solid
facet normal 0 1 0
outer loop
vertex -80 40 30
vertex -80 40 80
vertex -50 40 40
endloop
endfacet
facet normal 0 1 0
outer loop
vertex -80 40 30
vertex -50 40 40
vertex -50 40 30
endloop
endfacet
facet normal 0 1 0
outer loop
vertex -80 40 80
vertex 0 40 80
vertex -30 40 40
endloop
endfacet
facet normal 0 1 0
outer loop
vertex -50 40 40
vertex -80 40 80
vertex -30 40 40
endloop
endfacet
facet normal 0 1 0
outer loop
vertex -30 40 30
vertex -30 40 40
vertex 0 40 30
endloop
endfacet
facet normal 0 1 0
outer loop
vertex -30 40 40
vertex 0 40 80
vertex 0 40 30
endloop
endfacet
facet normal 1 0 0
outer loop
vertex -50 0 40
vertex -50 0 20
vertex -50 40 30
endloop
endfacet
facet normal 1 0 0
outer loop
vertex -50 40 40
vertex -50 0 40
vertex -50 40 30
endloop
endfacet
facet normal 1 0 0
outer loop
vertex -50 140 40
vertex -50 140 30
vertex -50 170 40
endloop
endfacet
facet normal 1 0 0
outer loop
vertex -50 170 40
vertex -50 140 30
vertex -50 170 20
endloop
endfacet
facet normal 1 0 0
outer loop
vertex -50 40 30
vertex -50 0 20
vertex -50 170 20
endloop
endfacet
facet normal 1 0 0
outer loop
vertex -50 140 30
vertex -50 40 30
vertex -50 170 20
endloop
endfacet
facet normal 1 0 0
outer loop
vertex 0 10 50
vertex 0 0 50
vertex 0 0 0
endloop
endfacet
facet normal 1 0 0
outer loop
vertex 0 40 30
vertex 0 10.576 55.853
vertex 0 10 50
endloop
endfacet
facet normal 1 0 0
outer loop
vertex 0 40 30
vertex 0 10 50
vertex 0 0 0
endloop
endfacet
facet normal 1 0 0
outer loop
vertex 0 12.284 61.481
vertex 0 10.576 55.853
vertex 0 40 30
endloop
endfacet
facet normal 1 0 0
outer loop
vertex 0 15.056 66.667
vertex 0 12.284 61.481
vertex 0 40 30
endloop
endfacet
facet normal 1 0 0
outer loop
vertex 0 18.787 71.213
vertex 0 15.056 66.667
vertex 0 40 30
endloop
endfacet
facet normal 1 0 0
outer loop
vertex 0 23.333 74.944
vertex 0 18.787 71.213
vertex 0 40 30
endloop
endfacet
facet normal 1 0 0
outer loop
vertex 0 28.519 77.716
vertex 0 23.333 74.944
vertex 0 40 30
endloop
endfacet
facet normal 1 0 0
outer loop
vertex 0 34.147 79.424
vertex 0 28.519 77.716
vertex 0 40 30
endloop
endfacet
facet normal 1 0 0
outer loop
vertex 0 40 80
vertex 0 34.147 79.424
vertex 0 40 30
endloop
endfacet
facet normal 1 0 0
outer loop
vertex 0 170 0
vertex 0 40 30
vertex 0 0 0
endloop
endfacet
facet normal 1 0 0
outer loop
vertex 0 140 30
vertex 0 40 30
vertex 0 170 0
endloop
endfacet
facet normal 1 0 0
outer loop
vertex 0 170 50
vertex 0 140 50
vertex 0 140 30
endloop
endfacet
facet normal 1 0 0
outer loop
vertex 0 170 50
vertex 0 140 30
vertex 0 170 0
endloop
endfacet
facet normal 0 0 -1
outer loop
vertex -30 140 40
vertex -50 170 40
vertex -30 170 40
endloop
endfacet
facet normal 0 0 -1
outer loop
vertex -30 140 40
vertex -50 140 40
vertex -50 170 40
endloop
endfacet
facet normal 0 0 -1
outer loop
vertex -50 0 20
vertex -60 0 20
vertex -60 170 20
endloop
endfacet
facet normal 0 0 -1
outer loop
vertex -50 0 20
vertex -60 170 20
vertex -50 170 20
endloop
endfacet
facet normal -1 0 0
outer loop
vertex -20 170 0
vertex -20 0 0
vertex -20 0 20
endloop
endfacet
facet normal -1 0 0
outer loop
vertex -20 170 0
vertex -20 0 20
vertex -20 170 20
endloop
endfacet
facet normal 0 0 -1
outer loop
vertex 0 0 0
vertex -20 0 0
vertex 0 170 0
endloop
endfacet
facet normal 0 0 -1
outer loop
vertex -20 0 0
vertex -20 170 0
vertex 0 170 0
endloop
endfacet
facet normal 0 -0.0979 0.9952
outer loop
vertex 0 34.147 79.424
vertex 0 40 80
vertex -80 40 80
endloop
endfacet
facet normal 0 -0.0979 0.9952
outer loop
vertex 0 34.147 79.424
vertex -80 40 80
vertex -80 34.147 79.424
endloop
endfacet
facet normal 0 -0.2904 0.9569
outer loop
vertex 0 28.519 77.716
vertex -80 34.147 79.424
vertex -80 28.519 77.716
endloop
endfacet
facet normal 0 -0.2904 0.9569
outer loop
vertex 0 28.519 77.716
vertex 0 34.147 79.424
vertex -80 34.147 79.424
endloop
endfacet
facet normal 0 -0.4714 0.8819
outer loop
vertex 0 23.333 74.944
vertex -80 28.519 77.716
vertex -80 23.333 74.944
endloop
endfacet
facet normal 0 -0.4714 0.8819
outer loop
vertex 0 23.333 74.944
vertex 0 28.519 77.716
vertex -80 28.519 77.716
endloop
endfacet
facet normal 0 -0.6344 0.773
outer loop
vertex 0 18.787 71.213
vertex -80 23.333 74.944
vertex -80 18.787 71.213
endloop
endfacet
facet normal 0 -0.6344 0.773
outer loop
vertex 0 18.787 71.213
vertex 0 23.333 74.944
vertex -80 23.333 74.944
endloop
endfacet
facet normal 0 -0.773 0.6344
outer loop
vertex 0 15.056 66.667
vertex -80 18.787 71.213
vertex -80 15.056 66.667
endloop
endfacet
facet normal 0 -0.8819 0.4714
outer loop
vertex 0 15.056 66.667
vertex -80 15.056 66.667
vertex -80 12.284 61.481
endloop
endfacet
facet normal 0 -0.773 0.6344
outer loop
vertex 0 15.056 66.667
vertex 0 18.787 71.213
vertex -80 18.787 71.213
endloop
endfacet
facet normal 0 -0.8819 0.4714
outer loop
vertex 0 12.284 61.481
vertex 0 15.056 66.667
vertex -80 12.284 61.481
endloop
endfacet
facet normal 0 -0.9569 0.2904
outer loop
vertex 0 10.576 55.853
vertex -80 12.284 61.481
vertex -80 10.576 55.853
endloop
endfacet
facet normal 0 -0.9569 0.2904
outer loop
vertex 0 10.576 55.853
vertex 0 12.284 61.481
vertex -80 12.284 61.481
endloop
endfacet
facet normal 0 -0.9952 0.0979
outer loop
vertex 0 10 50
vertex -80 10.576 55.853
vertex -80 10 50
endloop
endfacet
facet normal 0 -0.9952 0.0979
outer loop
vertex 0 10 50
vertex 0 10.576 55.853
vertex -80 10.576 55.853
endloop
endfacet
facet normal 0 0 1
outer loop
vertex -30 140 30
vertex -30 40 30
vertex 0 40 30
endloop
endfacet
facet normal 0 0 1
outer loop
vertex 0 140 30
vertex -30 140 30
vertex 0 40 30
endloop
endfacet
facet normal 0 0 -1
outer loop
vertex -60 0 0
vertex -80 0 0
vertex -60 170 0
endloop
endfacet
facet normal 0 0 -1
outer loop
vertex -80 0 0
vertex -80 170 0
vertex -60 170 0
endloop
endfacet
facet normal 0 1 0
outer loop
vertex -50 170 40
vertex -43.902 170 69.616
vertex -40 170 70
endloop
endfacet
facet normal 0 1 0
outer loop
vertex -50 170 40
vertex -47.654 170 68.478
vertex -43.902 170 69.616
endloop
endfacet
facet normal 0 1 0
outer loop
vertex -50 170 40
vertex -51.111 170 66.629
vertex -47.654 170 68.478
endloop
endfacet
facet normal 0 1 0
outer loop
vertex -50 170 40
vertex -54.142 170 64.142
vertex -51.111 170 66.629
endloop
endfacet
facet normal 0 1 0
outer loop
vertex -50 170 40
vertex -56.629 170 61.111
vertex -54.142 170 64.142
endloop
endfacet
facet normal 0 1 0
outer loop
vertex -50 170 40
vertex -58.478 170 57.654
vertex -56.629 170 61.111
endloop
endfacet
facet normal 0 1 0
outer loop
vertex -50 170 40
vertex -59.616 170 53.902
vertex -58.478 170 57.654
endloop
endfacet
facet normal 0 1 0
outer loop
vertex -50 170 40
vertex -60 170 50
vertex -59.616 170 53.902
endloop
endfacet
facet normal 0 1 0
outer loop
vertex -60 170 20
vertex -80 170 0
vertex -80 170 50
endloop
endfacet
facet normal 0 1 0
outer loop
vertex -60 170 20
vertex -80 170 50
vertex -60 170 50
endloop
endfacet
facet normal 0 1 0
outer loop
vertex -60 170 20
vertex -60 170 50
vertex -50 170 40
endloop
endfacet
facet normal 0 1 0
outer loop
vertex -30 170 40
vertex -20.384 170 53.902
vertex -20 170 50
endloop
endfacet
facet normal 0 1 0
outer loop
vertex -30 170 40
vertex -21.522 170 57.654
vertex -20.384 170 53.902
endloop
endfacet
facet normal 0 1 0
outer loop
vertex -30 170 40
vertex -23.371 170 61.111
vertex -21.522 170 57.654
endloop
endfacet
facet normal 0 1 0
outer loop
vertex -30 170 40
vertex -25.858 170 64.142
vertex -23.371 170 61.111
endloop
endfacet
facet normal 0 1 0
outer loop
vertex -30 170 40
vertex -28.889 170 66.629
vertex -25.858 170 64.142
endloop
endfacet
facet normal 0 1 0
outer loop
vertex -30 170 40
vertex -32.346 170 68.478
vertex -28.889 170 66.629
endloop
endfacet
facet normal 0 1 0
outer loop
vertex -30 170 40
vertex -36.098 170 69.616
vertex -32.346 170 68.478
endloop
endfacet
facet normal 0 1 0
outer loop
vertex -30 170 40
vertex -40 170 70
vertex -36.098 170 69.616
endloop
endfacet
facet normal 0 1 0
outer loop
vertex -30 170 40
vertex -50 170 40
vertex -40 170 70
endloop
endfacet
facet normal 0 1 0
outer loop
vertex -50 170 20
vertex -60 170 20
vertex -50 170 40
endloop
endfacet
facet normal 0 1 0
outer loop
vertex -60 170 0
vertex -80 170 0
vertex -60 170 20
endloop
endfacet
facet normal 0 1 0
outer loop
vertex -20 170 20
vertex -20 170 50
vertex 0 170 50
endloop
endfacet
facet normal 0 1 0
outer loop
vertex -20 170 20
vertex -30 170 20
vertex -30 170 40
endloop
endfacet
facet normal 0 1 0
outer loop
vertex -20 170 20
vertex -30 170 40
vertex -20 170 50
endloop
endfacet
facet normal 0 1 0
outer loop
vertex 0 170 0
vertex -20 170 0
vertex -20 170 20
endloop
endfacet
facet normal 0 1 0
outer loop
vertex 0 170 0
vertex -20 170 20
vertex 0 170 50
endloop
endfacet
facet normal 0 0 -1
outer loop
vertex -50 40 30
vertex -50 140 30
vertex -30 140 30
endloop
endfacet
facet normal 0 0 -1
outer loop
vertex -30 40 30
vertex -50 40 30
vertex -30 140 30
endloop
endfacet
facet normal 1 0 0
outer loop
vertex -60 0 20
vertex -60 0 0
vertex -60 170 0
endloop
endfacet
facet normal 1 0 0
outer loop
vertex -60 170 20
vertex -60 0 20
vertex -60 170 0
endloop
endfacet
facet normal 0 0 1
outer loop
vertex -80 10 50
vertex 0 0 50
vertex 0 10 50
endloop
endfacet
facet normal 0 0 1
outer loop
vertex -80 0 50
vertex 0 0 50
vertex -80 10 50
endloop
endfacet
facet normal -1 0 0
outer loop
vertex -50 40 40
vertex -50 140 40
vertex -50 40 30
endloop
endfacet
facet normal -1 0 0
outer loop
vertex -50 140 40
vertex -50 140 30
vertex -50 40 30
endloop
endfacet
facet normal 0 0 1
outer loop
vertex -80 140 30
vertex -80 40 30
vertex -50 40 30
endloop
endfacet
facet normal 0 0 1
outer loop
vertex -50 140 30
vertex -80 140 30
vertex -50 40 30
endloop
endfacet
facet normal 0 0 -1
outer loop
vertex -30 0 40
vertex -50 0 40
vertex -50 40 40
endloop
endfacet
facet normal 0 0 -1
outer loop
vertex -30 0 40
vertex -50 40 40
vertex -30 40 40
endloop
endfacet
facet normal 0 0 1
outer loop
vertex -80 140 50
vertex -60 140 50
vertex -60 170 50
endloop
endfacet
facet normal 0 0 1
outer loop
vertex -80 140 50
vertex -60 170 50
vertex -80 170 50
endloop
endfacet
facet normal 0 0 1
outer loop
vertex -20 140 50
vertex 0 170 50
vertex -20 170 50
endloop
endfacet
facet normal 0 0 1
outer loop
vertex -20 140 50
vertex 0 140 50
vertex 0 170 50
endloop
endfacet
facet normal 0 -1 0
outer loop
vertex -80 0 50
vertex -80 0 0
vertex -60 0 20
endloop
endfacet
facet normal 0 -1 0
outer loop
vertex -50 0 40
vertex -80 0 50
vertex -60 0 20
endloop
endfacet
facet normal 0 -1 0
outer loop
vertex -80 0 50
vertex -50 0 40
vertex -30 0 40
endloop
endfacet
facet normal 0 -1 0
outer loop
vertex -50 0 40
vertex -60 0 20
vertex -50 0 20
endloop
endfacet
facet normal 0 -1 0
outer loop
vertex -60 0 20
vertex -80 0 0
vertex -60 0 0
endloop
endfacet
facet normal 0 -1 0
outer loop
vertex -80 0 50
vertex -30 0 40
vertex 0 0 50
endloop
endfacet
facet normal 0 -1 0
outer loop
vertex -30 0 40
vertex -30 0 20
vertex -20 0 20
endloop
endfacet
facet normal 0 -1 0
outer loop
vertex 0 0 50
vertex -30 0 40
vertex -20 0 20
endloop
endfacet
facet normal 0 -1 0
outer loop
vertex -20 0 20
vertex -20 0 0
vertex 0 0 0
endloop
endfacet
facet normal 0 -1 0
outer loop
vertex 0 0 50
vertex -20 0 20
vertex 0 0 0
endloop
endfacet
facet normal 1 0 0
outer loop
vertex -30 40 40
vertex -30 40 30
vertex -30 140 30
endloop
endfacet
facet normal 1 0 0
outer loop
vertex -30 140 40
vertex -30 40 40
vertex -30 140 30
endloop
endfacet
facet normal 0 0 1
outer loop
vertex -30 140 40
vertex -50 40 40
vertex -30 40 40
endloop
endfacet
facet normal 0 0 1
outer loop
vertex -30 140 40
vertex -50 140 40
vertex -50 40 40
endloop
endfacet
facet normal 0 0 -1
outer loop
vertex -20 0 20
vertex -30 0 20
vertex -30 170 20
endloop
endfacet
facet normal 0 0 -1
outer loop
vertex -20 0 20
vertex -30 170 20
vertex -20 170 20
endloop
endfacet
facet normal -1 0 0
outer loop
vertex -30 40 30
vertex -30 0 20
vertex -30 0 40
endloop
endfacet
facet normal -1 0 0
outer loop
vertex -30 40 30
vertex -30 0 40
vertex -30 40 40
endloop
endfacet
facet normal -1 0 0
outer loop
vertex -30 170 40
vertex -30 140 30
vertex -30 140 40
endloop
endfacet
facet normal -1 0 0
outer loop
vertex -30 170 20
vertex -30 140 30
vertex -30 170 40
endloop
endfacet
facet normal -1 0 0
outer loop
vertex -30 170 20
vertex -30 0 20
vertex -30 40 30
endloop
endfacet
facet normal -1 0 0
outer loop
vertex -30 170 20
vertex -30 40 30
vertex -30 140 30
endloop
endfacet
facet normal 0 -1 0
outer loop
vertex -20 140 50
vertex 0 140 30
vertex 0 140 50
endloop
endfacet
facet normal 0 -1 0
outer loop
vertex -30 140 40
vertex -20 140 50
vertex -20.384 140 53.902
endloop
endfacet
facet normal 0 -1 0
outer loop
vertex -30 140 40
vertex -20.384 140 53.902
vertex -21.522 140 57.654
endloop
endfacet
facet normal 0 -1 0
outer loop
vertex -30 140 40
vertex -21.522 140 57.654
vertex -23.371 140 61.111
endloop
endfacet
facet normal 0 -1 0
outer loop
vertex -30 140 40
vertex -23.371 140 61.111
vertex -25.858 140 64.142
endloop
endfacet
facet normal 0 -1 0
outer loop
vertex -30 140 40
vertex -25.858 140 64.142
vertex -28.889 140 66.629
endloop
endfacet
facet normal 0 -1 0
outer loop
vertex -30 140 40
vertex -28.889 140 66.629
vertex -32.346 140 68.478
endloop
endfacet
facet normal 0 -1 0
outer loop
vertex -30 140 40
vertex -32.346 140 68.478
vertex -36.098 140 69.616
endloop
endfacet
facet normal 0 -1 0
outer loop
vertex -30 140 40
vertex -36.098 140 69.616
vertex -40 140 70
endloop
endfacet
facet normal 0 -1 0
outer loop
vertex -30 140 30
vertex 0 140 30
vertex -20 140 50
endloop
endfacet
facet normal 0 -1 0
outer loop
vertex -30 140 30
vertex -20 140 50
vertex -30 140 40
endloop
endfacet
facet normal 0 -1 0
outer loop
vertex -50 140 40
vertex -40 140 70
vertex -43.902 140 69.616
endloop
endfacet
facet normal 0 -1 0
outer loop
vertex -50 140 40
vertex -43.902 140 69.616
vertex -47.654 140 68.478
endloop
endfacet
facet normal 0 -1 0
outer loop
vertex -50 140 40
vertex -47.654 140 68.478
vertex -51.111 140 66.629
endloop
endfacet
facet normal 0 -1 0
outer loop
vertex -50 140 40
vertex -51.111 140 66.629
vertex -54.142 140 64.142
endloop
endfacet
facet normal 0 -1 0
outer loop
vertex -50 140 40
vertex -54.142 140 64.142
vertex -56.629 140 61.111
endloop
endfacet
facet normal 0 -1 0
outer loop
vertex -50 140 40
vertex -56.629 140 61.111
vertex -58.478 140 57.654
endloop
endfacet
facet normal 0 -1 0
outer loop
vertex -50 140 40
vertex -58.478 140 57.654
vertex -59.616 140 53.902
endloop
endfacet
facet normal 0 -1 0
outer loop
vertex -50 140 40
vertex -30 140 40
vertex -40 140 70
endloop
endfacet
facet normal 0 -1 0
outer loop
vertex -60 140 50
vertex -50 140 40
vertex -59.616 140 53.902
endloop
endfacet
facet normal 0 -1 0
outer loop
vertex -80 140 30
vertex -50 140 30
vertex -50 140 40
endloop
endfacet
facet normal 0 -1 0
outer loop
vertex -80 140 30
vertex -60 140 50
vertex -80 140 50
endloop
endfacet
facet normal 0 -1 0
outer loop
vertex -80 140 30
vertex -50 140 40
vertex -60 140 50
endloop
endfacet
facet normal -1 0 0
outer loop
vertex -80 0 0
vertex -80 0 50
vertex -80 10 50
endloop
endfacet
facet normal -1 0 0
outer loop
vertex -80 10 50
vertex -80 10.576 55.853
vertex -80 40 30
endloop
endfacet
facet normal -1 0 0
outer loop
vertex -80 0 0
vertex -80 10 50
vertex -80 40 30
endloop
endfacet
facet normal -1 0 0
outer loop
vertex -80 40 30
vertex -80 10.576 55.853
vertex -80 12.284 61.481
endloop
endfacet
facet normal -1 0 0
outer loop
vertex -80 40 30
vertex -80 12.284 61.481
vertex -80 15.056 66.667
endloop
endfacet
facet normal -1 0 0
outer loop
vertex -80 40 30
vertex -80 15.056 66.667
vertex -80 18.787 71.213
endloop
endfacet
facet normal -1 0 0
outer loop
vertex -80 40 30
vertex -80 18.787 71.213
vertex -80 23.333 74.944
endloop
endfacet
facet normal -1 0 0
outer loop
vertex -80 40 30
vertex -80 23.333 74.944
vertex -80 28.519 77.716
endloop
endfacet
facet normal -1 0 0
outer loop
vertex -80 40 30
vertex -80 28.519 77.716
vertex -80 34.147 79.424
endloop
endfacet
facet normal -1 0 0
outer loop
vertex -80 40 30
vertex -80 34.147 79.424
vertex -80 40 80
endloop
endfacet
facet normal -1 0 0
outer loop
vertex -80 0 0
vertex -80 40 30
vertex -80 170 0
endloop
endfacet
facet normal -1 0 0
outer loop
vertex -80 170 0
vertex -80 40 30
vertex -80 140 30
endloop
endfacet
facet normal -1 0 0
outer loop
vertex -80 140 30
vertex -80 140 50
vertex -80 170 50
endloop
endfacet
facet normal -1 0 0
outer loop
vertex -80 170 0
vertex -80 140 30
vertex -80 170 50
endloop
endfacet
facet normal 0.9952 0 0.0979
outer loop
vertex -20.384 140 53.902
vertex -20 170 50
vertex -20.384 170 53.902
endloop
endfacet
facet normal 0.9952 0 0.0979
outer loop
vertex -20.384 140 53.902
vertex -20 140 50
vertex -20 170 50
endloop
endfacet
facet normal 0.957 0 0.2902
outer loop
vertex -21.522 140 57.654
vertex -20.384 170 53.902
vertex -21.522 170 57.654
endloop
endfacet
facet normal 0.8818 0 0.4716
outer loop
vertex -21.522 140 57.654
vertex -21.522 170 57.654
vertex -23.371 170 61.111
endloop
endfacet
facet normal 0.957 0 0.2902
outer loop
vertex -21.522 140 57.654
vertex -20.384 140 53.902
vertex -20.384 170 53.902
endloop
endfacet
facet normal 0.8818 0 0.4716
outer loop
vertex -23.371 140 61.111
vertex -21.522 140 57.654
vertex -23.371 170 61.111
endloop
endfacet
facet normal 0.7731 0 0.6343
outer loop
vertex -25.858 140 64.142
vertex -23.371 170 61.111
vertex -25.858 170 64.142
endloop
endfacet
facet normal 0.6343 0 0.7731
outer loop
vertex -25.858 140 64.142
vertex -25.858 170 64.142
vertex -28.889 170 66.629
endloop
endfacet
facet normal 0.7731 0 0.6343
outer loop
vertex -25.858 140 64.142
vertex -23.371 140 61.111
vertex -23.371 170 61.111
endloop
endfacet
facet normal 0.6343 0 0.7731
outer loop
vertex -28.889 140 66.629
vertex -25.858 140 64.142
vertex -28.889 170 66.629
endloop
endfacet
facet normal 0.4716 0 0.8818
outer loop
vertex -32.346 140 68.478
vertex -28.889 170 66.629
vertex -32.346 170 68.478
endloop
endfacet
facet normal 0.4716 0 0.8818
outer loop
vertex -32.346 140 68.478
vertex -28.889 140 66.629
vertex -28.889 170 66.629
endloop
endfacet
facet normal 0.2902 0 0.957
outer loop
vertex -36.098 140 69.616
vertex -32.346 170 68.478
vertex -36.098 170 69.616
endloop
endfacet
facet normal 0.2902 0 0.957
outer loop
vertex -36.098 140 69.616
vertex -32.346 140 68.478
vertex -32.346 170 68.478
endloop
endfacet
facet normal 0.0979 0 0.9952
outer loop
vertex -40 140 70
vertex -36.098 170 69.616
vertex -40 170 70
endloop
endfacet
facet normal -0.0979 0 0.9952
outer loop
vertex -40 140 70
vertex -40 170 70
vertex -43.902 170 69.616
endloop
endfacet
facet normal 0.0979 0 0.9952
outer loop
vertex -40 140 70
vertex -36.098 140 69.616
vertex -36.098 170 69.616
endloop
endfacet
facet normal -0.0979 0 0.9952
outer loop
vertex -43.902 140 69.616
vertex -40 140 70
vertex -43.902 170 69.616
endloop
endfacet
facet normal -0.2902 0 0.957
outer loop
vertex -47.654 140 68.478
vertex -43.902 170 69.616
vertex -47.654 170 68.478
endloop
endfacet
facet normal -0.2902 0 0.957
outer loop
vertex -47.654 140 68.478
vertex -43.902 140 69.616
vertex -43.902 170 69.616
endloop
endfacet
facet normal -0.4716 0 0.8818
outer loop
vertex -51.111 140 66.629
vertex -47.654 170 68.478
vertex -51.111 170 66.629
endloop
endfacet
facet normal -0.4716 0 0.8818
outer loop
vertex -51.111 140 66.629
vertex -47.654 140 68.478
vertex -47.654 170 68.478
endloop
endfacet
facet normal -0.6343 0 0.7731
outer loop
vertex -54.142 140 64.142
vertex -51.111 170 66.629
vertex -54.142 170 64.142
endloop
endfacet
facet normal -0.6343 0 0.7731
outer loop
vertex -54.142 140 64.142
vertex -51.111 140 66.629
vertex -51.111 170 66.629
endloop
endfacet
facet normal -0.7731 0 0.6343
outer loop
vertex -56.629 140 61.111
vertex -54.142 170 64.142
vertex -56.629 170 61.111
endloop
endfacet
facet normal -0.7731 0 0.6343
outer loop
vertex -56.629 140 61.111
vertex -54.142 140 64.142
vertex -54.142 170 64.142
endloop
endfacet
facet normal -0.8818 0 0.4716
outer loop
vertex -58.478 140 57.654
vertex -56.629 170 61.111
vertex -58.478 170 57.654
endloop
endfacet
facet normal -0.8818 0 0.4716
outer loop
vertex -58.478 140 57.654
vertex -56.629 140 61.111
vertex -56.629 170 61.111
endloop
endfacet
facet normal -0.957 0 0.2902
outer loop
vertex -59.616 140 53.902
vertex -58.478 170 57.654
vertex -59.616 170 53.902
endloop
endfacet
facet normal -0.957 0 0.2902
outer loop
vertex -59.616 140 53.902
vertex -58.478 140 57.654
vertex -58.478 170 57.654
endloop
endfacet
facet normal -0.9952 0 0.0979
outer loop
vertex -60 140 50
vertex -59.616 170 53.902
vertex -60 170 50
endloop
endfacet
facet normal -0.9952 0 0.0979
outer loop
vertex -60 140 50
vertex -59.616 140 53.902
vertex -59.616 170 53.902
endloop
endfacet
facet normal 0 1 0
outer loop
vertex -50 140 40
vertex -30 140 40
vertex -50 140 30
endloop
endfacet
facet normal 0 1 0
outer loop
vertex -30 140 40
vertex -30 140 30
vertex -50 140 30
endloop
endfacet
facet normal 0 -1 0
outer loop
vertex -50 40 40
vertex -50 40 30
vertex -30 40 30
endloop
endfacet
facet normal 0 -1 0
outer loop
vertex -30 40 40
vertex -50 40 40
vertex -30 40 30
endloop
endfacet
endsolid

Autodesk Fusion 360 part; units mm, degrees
sketch "Sketch1" plane through (0, 0, 0) normal (0, 0, 1) x (1, 0, 0)
  line L0 (0, 0) -> (-80, 0)
  line L1 (-80, 0) -> (-80, 170)
  line L2 (-80, 170) -> (0, 170)
  line L3 (0, 170) -> (0, 0)
  dimension "d1" = 80
  dimension "d2" = 170
extrude "Extrude1" add sketch "Sketch1" along normal blind 30 makes body 1
sketch "Sketch2" plane through (0, 0, 30) normal (0, 0, 1) x (-1, 0, 0)
  line L0 (0, -170) -> (80, -170)
  line L1 (80, -170) -> (80, 0)
  line L2 (80, 0) -> (0, 0)
  line L3 (0, 0) -> (0, -170)
  line L4 (80, -170) -> (0, -170)
  line L5 (0, -170) -> (0, -140)
  line L6 (0, -140) -> (80, -140)
  line L7 (80, -140) -> (80, -170)
  dimension "d5" = 30
extrude "Extrude2" add sketch "Sketch2" along normal blind 20 contours L0 L1 L3 L4 L5 L6 L7 bodies 1
sketch "Sketch3" plane through (0, 140, 0) normal (0, -1, 0) x (1, 0, 0)
  line L0 (-80, 30) -> (0, 30)
  line L1 (0, 30) -> (0, 50)
  line L2 (0, 50) -> (-80, 50)
  line L3 (-80, 50) -> (-80, 30)
  arc A0 (-20, 50) -> (-60, 50) centre (-40, 50) ccw
  dimension "d8" = 20
extrude "Extrude3" add sketch "Sketch3" against normal blind 30 contours L2 A0 bodies 1
sketch "Sketch4" plane through (0, 0, 30) normal (0, 0, 1) x (-1, 0, 0)
  line L0 (0, -140) -> (80, -140)
  line L1 (80, -140) -> (80, 0)
  line L2 (80, 0) -> (0, 0)
  line L3 (0, 0) -> (0, -140)
sketch "Sketch5" plane through (0, 0, 30) normal (0, 0, 1) x (-1, 0, 0)
  line L0 (80, 0) -> (0, 0)
  line L1 (0, 0) -> (0, -40)
  line L2 (0, -40) -> (80, -40)
  line L3 (80, -40) -> (80, 0)
  dimension "d11" = 40
extrude "Extrude4" add sketch "Sketch5" along normal blind 20 bodies 1
sketch "Sketch6" plane through (0, 0, 0) normal (1, 0, 0) x (0, 1, 0)
  line L0 (0, 0) -> (170, 0)
  line L1 (170, 0) -> (170, 50)
  line L2 (170, 50) -> (140, 50)
  line L3 (140, 50) -> (140, 30)
  line L4 (140, 30) -> (40, 30)
  line L5 (40, 30) -> (40, 50)
  line L6 (40, 50) -> (0, 50)
  line L7 (0, 50) -> (0, 0)
  arc A0 (40, 80) -> (10, 50) centre (40, 50) ccw
  line L8 (40, 80) -> (40, 50)
  dimension "d14" = 30
extrude "Extrude5" add sketch "Sketch6" against normal blind 80 contours L6 A0 L8 bodies 1
sketch "Sketch7" plane through (0, 0, 30) normal (0, 0, 1) x (1, 0, 0)
  line L0 (-40, 140) -> (-50, 140)
  line L1 (-50, 140) -> (-50, 40)
  line L2 (-50, 40) -> (-40, 40)
  line L3 (-40, 140) -> (-30, 140)
  line L4 (-30, 140) -> (-30, 40)
  line L5 (-30, 40) -> (-40, 40)
extrude "Extrude6" add sketch "Sketch7" along normal blind 10 bodies 1
sketch "Sketch8" plane through (0, 0, 0) normal (0, 0, -1) x (1, 0, 0)
  line L0 (-80, -170) -> (0, -170)
  line L1 (0, -170) -> (0, 0)
  line L2 (0, 0) -> (-80, 0)
  line L3 (-80, 0) -> (-80, -170)
  line L4 (-40, 0) -> (-60, 0)
  line L5 (-60, 0) -> (-60, -170)
  line L6 (-60, -170) -> (-40, -170)
  line L7 (-40, 0) -> (-20, 0)
  line L8 (-20, 0) -> (-20, -170)
  line L9 (-20, -170) -> (-40, -170)
  dimension "d20" = 20
extrude "Extrude7" cut sketch "Sketch8" against normal blind 20 contours L0 L2 L4 L5 L6 L7 L8 L9 bodies 1
sketch "Sketch9" plane through (0, 0, 20) normal (0, 0, -1) x (1, 0, 0)
  line L0 (-20, 0) -> (-60, 0)
  line L1 (-60, 0) -> (-60, -170)
  line L2 (-60, -170) -> (-20, -170)
  line L3 (-20, -170) -> (-20, 0)
  line L4 (-40, 0) -> (-50, 0)
  line L5 (-50, 0) -> (-50, -170)
  line L6 (-50, -170) -> (-40, -170)
  line L7 (-40, 0) -> (-30, 0)
  line L8 (-30, 0) -> (-30, -170)
  line L9 (-30, -170) -> (-40, -170)
extrude "Extrude8" cut sketch "Sketch9" against normal blind 20 contours L0 L2 L4 L5 L6 L7 L8 L9 bodies 1
sketch "Sketch10" plane through (0, 0, 30) normal (0, 0, 1) x (1, 0, 0)
  line L0 (-50, 40) -> (-30, 40)
  line L1 (-30, 40) -> (-30, 140)
  line L2 (-30, 140) -> (-50, 140)
  line L3 (-50, 140) -> (-50, 40)
extrude "Extrude9" add sketch "Sketch10" along normal blind 10 separate body makes body 2
